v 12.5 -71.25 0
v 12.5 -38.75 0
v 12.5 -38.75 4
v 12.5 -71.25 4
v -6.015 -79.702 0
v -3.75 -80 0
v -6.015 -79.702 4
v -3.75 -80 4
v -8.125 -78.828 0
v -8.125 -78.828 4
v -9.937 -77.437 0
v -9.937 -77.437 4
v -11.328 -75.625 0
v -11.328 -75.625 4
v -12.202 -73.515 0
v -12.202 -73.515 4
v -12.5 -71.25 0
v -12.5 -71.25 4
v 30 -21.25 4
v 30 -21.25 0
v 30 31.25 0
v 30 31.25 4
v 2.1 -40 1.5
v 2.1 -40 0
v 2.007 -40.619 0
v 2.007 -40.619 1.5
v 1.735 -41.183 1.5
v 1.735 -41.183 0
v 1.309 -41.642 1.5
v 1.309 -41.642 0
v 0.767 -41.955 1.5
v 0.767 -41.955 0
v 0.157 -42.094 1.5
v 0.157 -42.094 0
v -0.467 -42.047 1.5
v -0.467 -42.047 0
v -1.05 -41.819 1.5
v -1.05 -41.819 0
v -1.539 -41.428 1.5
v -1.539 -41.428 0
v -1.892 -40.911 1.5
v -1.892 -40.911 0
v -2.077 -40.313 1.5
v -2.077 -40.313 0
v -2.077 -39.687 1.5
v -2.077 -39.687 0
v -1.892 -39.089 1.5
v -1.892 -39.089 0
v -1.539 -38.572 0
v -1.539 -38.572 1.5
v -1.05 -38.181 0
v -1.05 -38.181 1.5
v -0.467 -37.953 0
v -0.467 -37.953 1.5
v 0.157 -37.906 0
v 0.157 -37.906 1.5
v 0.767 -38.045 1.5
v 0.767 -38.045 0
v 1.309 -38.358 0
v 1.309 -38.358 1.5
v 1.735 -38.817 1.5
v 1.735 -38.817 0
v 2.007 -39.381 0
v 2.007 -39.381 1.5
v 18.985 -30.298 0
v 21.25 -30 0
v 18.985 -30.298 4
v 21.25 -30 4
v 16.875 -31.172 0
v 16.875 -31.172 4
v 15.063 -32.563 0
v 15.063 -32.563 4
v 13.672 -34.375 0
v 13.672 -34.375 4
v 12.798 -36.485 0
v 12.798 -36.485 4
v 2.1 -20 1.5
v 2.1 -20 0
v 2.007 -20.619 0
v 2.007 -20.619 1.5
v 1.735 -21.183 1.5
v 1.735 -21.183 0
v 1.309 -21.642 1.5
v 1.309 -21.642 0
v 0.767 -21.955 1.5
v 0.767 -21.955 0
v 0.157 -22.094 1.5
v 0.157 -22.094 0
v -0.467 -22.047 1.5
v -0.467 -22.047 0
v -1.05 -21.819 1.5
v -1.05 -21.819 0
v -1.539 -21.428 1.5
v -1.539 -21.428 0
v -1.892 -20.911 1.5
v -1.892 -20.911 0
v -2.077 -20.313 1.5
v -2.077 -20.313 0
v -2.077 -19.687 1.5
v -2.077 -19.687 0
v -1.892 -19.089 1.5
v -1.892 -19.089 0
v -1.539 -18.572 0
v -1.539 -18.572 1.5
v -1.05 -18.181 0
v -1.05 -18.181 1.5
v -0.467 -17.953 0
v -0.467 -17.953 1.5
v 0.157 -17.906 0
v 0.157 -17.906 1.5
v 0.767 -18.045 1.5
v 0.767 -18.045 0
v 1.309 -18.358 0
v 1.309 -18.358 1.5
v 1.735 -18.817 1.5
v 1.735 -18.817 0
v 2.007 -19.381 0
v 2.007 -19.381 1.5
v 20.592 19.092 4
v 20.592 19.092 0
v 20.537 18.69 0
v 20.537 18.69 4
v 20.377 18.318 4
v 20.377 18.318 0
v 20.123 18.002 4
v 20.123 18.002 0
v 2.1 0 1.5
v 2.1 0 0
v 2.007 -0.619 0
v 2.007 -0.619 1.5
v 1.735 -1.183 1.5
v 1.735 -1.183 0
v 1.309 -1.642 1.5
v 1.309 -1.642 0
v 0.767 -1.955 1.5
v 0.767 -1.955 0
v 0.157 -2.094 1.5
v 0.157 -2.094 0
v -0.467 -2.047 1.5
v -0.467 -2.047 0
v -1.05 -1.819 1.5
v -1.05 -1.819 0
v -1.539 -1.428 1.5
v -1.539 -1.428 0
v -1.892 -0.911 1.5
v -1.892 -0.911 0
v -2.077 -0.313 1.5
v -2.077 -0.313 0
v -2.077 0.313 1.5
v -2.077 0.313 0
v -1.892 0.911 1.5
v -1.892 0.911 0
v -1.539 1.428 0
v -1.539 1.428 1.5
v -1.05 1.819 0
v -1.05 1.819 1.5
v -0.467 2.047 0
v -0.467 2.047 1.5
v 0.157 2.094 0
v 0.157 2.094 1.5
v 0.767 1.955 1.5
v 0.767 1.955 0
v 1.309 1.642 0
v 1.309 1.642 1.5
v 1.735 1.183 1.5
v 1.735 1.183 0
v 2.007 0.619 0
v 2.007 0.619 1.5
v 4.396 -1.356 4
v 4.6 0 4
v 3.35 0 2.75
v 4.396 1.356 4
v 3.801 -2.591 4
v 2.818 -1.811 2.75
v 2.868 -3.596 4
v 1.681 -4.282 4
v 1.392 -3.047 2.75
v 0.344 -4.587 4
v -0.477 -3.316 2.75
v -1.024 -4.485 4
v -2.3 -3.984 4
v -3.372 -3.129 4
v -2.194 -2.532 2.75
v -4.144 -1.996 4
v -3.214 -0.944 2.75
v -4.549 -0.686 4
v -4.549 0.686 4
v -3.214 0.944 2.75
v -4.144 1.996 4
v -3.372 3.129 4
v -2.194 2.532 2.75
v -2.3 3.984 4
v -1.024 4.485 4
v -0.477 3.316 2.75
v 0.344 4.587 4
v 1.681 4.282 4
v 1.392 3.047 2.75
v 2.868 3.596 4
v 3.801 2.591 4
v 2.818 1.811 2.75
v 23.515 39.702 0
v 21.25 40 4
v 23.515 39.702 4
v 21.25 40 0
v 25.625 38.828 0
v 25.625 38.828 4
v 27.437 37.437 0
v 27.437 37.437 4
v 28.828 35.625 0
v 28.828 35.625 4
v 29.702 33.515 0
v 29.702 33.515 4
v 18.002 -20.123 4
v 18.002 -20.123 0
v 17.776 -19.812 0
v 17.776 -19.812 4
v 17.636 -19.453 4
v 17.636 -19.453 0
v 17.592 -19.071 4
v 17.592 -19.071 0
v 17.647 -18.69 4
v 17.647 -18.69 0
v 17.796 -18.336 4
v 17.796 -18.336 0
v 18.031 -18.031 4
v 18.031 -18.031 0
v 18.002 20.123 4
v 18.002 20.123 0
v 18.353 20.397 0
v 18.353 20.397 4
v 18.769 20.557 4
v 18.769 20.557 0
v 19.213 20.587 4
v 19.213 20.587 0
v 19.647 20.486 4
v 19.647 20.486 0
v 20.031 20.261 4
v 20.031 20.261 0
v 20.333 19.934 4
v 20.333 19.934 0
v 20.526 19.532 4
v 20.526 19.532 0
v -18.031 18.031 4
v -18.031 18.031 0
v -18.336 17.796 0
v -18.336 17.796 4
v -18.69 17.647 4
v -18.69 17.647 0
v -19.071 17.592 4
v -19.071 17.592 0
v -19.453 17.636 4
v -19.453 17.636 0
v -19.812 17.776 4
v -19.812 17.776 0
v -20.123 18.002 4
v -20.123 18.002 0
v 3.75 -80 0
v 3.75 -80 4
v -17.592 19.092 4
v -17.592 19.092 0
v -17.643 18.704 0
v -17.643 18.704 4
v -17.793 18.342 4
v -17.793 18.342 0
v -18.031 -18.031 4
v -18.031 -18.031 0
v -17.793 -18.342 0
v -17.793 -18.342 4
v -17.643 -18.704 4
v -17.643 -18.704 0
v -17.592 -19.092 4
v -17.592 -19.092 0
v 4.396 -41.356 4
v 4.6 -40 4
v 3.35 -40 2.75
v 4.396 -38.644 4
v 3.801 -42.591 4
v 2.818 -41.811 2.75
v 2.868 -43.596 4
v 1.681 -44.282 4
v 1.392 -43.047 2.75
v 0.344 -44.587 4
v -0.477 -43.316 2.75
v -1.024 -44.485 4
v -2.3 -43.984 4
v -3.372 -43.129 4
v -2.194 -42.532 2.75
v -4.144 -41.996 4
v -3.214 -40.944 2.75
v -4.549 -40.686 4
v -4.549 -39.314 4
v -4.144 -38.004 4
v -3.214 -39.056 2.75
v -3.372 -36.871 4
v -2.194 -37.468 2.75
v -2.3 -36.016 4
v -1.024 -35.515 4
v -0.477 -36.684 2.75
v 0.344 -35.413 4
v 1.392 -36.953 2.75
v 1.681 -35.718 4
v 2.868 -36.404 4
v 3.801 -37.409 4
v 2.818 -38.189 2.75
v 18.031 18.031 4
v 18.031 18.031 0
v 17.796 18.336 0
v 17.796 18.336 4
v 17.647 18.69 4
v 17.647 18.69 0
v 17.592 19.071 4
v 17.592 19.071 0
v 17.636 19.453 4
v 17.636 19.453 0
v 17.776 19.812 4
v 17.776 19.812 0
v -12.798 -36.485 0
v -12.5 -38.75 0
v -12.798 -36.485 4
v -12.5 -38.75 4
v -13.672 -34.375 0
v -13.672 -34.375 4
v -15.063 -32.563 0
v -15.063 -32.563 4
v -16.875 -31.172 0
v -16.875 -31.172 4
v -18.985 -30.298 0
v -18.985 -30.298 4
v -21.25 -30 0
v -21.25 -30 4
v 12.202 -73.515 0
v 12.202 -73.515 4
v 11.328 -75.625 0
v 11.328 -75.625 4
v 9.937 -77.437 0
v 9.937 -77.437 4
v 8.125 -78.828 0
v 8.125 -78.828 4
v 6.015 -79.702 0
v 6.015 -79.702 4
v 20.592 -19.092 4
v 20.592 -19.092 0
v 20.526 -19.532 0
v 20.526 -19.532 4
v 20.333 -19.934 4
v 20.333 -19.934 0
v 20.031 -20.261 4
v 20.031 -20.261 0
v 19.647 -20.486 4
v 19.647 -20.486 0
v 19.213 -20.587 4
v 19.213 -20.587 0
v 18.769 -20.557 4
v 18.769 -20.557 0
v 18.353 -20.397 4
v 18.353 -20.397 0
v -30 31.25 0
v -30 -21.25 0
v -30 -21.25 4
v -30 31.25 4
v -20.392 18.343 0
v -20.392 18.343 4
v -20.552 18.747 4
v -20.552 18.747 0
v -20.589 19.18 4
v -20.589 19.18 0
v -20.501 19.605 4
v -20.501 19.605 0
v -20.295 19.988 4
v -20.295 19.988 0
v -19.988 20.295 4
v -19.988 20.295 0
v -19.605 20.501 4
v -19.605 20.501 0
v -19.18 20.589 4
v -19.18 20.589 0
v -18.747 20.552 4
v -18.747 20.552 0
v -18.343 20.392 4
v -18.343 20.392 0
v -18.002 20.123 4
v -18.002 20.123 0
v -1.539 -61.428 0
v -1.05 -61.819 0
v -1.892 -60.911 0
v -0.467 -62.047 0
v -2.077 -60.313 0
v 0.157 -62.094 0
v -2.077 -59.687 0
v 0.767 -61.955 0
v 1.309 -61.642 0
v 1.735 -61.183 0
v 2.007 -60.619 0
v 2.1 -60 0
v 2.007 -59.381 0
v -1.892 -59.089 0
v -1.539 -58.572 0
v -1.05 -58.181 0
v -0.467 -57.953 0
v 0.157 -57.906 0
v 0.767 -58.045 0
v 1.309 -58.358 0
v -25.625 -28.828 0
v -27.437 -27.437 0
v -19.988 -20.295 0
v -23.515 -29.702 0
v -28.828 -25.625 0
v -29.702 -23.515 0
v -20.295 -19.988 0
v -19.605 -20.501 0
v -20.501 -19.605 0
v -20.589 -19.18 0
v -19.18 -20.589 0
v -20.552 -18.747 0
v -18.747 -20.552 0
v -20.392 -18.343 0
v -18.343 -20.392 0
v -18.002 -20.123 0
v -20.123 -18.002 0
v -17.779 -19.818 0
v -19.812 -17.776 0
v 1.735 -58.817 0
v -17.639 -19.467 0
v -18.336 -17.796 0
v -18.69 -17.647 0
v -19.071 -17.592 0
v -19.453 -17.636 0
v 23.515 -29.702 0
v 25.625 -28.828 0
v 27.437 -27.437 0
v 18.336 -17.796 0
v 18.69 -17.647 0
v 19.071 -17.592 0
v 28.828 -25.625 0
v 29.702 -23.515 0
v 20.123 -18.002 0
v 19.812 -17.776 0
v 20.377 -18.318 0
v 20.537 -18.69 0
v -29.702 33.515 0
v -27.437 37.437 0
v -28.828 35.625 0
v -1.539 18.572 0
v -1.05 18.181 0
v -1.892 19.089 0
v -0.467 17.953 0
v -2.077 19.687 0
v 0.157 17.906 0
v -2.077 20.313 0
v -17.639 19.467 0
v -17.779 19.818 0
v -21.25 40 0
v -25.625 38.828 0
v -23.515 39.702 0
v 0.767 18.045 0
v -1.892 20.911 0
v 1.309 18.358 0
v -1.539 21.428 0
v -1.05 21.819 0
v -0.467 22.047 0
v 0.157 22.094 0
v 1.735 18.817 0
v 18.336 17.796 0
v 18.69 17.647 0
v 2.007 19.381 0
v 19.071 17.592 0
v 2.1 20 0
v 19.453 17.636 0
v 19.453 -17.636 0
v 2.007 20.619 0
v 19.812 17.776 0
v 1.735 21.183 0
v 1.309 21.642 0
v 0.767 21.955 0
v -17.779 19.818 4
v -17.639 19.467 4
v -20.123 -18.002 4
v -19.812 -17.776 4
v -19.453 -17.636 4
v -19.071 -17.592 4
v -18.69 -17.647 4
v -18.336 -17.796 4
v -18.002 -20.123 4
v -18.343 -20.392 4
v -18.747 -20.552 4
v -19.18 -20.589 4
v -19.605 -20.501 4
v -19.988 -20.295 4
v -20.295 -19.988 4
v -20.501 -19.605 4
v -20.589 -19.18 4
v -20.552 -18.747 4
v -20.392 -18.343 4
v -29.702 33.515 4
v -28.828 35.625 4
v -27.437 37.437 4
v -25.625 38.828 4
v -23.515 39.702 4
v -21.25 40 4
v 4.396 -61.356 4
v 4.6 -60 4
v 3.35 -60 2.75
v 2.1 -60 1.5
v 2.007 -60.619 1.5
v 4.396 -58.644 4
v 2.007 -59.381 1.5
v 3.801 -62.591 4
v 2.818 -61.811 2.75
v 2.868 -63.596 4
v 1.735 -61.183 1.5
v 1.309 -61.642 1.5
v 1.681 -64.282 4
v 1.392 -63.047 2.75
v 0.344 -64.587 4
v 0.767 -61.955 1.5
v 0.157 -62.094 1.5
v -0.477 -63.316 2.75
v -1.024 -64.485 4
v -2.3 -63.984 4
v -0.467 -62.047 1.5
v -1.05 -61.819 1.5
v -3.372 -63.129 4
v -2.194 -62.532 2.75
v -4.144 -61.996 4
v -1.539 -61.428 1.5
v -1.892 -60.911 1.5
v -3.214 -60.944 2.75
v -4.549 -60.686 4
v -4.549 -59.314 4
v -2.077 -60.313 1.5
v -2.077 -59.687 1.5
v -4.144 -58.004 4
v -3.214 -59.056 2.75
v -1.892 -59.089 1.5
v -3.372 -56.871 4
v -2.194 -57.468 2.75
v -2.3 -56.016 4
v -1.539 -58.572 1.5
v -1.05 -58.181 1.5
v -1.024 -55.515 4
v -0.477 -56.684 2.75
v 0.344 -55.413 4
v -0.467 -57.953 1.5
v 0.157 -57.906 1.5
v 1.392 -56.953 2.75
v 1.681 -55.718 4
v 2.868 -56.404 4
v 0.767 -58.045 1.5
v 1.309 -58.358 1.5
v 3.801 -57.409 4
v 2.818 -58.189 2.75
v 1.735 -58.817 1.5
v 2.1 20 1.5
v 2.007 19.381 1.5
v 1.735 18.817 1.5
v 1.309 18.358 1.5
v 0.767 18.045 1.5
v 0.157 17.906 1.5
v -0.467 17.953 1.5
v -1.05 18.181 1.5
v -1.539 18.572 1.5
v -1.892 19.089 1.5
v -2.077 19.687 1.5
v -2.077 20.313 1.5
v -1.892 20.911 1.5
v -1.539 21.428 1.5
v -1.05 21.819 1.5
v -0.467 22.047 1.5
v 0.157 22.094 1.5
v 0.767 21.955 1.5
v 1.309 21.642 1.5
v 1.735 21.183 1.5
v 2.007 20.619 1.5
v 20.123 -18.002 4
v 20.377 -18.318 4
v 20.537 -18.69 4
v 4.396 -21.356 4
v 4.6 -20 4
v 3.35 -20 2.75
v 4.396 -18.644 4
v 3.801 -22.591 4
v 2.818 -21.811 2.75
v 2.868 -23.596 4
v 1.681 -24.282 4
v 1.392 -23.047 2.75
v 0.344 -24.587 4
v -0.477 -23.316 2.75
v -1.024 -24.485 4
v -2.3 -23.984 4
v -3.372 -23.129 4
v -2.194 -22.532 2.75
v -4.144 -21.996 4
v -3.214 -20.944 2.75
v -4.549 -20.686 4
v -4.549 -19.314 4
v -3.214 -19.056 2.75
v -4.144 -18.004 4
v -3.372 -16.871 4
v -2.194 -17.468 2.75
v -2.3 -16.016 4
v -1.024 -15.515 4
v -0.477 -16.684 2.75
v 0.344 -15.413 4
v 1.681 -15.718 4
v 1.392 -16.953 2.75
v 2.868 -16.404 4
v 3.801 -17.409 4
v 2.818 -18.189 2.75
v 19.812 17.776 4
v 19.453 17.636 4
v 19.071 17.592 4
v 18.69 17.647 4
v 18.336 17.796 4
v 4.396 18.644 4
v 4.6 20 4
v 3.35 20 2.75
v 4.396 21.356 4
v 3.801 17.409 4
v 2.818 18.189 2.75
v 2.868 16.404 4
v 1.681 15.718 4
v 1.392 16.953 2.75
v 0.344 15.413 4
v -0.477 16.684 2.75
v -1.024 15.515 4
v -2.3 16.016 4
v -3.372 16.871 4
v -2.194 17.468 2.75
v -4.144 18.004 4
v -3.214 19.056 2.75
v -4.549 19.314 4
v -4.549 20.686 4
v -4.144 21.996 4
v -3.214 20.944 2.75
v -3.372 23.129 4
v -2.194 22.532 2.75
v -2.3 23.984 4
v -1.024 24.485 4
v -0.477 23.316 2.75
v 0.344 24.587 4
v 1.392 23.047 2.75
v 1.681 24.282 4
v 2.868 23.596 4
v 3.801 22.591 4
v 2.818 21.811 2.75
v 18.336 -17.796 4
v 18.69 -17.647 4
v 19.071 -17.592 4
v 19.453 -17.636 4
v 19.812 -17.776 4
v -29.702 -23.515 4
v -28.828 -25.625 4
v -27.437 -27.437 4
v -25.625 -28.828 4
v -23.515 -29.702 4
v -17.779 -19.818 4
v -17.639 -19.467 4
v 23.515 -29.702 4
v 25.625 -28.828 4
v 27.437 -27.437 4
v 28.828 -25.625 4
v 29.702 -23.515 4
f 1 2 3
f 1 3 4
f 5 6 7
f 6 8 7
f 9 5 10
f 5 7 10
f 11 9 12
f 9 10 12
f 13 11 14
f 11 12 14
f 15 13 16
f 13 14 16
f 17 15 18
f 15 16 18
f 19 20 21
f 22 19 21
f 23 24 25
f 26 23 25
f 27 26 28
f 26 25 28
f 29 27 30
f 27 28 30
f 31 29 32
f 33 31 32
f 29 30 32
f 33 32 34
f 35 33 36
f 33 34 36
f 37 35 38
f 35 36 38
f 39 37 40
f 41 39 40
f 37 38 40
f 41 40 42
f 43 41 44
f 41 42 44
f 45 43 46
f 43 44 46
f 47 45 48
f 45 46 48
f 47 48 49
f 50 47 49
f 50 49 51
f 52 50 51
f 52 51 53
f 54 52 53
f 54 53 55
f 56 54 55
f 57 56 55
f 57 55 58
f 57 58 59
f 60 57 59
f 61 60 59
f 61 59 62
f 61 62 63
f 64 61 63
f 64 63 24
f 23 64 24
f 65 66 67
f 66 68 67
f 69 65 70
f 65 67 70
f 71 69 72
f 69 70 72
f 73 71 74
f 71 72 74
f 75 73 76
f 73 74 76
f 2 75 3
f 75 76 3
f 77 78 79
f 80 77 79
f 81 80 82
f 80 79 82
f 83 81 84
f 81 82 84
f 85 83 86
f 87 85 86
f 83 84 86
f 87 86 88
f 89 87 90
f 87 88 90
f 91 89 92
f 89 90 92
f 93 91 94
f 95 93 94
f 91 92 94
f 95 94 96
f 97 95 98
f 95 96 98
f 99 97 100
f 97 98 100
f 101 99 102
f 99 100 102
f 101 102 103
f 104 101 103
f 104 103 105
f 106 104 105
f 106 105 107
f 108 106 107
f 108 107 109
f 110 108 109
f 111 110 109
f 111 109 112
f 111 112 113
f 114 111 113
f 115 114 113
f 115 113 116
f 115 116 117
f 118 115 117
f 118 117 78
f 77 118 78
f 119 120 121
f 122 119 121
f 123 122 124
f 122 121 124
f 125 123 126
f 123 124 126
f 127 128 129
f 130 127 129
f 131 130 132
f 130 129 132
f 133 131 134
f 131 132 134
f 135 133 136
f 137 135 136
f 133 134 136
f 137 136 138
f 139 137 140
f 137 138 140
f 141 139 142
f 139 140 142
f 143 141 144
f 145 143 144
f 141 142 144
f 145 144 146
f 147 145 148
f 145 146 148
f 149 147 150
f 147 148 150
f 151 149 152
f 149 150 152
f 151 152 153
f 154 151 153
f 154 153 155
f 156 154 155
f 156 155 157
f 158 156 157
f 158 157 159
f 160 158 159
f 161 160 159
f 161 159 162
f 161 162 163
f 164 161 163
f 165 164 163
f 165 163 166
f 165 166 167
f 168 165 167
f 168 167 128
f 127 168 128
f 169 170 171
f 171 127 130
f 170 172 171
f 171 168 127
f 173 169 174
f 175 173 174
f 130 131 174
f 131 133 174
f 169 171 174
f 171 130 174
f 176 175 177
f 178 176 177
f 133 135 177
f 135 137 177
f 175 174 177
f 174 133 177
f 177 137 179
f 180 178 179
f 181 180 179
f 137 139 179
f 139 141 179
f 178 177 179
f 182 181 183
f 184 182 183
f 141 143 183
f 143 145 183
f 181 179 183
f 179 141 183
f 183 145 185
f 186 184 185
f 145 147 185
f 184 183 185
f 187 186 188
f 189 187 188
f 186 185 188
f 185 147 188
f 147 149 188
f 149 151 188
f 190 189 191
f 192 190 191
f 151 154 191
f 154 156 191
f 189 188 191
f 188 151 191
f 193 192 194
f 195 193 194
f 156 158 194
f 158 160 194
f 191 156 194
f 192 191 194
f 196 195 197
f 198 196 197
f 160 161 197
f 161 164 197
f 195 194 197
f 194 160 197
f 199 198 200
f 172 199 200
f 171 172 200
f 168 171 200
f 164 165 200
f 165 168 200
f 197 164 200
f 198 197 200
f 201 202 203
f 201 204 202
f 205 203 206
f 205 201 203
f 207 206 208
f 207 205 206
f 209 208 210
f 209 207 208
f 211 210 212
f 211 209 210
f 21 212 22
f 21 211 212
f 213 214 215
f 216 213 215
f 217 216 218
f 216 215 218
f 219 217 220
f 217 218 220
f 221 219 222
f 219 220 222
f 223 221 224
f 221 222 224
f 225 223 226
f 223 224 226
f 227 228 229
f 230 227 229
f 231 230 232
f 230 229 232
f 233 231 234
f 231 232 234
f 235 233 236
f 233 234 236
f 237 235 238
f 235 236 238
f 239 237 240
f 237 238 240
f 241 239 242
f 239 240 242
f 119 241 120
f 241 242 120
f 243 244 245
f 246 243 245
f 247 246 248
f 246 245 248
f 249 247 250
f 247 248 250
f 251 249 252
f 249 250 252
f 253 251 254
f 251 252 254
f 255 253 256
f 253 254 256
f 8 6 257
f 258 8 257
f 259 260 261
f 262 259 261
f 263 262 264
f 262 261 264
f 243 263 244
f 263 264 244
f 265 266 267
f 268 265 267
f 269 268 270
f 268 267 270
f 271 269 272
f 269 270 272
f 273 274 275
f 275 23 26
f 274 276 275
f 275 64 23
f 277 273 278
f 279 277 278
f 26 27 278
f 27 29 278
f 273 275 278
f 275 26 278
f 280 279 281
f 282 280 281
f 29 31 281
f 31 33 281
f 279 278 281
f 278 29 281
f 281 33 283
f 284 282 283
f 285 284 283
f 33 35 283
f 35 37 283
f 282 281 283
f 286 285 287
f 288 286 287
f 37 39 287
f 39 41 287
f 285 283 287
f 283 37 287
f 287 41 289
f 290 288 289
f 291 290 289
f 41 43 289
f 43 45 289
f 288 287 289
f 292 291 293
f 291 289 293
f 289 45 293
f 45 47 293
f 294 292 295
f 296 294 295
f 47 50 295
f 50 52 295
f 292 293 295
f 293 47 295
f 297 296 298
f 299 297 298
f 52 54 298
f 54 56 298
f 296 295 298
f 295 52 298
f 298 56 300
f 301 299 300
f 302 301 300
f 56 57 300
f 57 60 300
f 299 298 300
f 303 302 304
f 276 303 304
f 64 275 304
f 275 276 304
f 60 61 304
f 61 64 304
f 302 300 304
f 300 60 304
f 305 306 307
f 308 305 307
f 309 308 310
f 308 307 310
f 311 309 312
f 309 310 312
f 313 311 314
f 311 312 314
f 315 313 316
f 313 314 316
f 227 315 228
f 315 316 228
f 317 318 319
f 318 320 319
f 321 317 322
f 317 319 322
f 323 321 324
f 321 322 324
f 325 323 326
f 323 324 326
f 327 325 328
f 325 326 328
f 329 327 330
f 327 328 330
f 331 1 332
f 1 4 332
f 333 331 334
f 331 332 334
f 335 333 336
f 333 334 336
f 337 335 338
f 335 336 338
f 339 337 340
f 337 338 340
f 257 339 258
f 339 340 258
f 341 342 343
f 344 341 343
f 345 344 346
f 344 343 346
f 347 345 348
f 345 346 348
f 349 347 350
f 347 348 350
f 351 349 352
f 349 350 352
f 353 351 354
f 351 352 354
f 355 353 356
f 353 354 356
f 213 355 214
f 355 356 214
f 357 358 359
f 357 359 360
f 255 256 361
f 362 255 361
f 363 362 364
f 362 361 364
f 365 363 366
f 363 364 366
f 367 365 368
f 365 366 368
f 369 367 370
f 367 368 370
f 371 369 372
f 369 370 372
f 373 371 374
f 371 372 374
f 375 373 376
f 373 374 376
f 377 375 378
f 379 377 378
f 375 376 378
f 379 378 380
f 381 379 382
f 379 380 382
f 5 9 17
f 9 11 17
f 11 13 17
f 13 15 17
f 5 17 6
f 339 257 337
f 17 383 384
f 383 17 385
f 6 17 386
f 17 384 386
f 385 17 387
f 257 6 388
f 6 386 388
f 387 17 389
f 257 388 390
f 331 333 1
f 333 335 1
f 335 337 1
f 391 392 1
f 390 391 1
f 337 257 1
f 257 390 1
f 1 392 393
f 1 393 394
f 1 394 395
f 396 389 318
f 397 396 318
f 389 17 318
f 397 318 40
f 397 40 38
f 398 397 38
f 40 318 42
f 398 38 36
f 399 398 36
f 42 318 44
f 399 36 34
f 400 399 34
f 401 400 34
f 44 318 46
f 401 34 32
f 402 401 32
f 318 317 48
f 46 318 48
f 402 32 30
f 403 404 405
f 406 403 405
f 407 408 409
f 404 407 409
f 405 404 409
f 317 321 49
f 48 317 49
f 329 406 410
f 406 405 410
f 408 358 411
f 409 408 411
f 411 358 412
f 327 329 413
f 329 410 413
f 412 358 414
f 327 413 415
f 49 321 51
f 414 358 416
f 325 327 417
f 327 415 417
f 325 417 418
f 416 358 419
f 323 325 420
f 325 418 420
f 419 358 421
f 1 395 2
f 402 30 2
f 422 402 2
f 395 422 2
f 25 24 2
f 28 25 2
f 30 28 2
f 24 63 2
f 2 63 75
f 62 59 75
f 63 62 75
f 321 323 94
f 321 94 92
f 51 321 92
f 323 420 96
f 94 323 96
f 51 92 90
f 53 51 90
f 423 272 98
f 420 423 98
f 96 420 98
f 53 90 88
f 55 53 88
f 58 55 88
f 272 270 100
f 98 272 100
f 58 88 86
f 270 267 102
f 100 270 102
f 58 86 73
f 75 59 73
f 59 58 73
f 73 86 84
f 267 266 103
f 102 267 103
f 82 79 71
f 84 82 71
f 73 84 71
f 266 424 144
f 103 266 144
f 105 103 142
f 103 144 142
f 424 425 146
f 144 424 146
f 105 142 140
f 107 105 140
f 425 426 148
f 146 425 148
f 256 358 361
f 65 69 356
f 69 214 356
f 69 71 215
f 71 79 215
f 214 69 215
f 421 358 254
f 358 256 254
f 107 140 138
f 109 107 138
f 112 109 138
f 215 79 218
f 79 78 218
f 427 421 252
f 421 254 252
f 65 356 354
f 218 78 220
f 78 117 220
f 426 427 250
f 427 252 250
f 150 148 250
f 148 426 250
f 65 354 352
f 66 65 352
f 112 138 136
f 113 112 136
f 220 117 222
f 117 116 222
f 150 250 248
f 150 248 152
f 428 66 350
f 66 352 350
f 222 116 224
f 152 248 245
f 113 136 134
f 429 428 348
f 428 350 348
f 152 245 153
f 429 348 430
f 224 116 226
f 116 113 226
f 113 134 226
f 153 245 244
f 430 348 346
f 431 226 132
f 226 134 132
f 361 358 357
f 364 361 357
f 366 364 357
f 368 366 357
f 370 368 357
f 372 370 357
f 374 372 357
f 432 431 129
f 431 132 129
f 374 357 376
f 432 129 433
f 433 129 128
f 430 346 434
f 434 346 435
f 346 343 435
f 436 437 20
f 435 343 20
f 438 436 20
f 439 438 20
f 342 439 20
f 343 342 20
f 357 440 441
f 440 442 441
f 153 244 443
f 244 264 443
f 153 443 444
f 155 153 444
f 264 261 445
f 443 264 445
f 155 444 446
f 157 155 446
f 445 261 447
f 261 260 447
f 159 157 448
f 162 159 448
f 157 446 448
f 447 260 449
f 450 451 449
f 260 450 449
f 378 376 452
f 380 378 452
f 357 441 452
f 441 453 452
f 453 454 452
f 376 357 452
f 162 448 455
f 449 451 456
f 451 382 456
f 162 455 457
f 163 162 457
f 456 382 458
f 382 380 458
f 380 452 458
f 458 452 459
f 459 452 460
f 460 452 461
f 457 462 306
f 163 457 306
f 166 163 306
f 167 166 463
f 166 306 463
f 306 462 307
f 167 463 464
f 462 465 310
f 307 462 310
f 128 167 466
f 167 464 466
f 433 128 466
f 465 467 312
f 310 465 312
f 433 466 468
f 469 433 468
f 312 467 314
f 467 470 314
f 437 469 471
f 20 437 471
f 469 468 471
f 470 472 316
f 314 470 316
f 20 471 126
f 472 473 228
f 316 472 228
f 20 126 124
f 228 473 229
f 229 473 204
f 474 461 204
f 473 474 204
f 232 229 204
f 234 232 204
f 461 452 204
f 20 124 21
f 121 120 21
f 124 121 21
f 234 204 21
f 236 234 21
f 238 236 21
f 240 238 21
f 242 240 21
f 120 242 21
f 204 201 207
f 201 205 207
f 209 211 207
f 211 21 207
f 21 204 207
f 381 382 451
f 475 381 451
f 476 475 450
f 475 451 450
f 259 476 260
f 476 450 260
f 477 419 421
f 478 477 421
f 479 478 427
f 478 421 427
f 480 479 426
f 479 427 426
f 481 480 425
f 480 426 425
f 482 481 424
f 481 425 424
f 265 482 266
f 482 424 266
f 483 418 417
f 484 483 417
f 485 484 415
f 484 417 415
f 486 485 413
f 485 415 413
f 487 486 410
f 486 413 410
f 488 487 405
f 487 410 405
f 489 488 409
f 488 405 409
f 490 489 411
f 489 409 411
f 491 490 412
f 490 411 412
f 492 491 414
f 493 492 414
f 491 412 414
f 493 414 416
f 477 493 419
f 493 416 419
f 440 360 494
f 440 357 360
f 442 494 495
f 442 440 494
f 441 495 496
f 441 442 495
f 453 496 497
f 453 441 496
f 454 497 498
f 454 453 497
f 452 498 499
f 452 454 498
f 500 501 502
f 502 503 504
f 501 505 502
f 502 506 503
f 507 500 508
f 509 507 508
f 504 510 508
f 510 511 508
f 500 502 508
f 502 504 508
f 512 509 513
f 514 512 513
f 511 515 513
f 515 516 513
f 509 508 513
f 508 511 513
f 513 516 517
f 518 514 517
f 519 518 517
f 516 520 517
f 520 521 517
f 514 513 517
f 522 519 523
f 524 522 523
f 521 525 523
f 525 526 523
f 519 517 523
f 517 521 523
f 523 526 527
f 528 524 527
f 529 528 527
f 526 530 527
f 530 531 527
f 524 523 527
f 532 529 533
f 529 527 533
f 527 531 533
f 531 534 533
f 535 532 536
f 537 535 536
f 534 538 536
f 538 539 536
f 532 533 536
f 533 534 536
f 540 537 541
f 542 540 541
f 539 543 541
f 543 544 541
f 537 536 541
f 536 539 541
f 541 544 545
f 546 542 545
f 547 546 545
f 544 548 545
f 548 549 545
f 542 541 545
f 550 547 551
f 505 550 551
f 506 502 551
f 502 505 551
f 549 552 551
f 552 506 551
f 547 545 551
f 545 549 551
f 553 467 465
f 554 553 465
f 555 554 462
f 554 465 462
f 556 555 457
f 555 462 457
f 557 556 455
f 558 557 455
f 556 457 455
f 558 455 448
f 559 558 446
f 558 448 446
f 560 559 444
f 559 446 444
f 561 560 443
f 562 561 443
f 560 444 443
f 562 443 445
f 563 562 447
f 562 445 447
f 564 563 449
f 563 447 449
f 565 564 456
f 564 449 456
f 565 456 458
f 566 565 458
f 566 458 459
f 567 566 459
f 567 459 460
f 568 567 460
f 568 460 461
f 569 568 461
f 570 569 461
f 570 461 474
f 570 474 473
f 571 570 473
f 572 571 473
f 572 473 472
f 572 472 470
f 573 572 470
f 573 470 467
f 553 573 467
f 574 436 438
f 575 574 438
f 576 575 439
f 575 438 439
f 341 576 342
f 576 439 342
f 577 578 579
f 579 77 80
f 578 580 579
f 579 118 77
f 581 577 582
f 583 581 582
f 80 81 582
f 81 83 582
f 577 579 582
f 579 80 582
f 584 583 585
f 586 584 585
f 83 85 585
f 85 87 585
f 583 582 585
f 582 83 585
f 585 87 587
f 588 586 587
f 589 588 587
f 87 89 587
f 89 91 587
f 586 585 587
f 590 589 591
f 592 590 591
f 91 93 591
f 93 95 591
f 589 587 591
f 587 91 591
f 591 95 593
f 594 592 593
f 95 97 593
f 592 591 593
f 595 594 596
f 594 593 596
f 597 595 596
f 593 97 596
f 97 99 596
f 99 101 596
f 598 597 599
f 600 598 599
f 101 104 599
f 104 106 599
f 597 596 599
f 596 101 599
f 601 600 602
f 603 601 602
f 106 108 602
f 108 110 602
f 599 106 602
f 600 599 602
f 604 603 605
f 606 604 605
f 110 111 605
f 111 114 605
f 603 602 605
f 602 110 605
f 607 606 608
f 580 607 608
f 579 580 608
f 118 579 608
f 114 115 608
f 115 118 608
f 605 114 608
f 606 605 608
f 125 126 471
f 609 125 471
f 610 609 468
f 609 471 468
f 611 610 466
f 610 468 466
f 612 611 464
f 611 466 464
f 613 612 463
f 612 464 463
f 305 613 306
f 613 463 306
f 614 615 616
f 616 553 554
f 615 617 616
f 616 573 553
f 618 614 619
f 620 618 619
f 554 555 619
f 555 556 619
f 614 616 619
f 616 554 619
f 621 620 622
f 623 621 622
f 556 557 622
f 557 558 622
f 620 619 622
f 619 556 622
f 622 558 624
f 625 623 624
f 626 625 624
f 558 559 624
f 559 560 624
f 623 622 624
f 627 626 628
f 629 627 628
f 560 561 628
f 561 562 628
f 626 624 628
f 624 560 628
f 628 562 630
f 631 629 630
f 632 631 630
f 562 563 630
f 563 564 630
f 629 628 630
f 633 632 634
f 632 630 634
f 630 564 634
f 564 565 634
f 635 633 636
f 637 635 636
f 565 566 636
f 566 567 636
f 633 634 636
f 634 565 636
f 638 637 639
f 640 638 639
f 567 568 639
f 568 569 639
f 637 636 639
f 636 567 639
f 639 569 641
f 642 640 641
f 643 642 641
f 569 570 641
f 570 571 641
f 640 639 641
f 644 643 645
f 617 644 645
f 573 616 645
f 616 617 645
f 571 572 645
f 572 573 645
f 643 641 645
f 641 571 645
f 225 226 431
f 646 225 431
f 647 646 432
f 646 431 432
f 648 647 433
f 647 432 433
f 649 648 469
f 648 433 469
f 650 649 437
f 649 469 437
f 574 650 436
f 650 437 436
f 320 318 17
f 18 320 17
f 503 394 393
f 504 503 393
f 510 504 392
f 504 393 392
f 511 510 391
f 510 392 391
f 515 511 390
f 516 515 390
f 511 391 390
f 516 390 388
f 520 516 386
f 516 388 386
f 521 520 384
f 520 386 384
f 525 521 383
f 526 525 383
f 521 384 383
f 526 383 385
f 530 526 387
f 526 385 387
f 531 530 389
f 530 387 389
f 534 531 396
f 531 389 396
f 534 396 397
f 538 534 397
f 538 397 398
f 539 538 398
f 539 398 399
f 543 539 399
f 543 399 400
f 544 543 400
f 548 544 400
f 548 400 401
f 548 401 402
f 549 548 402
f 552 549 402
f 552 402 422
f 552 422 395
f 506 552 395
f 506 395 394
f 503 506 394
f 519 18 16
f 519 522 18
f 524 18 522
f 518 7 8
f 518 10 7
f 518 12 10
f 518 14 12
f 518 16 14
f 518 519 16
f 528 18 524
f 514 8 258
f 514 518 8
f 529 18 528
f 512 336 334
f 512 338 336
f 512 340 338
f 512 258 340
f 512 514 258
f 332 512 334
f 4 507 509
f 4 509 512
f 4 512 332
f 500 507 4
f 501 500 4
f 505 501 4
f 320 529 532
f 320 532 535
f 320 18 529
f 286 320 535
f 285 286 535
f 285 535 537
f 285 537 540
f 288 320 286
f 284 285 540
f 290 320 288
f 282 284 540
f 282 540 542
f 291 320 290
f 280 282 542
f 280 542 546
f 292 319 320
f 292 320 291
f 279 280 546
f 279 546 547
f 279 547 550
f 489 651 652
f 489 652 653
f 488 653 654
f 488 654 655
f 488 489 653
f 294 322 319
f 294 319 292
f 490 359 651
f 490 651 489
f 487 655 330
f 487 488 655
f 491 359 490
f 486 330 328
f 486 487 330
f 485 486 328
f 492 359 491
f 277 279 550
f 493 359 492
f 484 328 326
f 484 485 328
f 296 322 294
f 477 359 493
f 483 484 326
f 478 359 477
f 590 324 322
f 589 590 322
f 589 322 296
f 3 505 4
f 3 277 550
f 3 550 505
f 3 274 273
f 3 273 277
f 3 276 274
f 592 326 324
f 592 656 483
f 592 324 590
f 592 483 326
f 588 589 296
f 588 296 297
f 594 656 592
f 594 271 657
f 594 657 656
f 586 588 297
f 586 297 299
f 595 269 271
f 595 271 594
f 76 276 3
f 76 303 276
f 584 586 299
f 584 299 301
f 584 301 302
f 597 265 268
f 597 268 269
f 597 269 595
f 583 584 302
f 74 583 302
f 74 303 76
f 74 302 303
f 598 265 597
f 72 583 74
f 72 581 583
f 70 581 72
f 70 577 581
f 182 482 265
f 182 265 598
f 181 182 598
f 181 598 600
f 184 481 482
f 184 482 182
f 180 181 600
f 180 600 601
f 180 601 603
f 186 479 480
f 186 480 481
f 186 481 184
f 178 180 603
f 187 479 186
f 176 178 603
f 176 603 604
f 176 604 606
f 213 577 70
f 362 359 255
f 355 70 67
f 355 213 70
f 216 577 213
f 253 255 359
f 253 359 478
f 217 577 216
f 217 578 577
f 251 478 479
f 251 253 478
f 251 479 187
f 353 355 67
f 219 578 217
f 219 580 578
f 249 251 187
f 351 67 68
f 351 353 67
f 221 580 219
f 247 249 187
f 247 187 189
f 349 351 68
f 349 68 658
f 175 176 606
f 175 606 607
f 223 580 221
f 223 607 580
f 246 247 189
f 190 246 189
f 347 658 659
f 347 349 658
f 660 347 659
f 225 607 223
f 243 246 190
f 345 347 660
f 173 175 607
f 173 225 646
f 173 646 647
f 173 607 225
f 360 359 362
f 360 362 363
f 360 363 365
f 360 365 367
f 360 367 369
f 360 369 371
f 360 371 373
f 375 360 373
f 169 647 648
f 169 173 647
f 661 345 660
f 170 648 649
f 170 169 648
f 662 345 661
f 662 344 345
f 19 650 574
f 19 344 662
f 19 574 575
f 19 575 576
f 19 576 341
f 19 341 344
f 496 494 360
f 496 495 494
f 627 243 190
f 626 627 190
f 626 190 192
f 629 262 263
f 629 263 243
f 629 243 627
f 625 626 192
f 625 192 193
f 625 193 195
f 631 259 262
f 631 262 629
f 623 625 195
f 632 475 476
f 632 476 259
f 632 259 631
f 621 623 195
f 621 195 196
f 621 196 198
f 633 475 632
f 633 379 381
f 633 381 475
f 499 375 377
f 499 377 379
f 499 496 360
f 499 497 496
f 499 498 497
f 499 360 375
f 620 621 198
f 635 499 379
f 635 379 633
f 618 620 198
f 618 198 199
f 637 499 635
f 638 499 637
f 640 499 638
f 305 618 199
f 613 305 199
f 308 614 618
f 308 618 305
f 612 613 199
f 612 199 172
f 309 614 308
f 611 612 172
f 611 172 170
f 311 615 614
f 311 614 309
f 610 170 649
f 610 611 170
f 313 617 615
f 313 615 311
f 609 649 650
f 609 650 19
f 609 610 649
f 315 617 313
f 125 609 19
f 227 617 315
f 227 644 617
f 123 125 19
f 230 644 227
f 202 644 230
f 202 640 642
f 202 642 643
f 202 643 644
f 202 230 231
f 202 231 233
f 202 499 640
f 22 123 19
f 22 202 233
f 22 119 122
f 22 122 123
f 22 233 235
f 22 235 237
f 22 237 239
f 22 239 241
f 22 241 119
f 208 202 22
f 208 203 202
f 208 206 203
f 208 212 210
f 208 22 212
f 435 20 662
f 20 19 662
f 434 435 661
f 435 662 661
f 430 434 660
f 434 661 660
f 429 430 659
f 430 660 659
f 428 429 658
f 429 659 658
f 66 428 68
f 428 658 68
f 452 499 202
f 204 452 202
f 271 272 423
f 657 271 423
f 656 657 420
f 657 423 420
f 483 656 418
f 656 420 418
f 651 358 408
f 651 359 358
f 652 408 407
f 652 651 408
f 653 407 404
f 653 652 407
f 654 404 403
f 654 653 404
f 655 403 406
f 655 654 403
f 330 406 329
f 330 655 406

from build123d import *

# Parameters (mm, degrees)
F0_W     = 60
F0_H     = 160
F1_DEPTH = 4
F2_W     = 60
F2_H     = 40
F3_DEPTH = 4.001
F4_R     = 2.1
F5_DEPTH = 4.001
F6_SIZE  = 2.5
F7_W     = 17.5
F7_H     = 50
F8_DEPTH = 4.001
F9_R     = 8.74999


# Not quite as in the source:
# - a fillet or chamfer is up to 0.001 mm smaller than in the source, because OpenCascade refuses the exact size


with BuildPart() as f1:
    # F0 (on Top) → F1 (new body)
    with BuildSketch(Plane.XY):
        Rectangle(F0_W, F0_H)
        with BuildLine():
            ThreePointArc((20.122671197, 18.002169422), (25.2221343498, 9.6355559695), (27, 0))
            ThreePointArc((27, 0), (25.2221343498, -9.6355559695), (20.122671197, -18.002169422))
            ThreePointArc((20.122671197, -18.002169422), (20.4695953547, -18.4986639746), (20.591883092, -19.091883092))
            ThreePointArc((20.591883092, -19.091883092), (19.6466035148, -20.4855420362), (18.002169422, -20.122671197))
            ThreePointArc((18.002169422, -20.122671197), (0, -27), (-18.002169422, -20.122671197))
            ThreePointArc((-18.002169422, -20.122671197), (-20.1525432638, -20.1525432638), (-20.122671197, -18.002169422))
            ThreePointArc((-20.122671197, -18.002169422), (-27, 0), (-20.122671197, 18.002169422))
            ThreePointArc((-20.122671197, 18.002169422), (-20.1525432638, 20.1525432638), (-18.002169422, 20.122671197))
            ThreePointArc((-18.002169422, 20.122671197), (0, 27), (18.002169422, 20.122671197))
            ThreePointArc((18.002169422, 20.122671197), (19.6466035148, 20.4855420362), (20.591883092, 19.091883092))
            ThreePointArc((20.591883092, 19.091883092), (20.4695953547, 18.4986639746), (20.122671197, 18.002169422))
        make_face(mode=Mode.SUBTRACT)
        with BuildLine():
            Line((-18.0312229203, -18.0312229203), (0, 0))
            Line((0, 0), (-18.0312229203, 18.0312229203))
            ThreePointArc((-18.0312229203, 18.0312229203), (-19.0710477486, 17.5920278029), (-20.122671197, 18.002169422))
            ThreePointArc((-20.122671197, 18.002169422), (-27, 0), (-20.122671197, -18.002169422))
            ThreePointArc((-20.122671197, -18.002169422), (-19.0710477486, -17.5920278029), (-18.0312229203, -18.0312229203))
        make_face()
        with BuildLine():
            Line((0, 0), (18.0312229203, 18.0312229203))
            ThreePointArc((18.0312229203, 18.0312229203), (17.5920278029, 19.0710477486), (18.002169422, 20.122671197))
            ThreePointArc((18.002169422, 20.122671197), (0, 27), (-18.002169422, 20.122671197))
            ThreePointArc((-18.002169422, 20.122671197), (-17.6982241479, 19.6466035148), (-17.591883092, 19.091883092))
            ThreePointArc((-17.591883092, 19.091883092), (-17.7060637933, 18.5178579435), (-18.0312229203, 18.0312229203))
            Line((-18.0312229203, 18.0312229203), (0, 0))
        make_face()
        with BuildLine():
            ThreePointArc((20.122671197, -18.002169422), (25.2221343498, -9.6355559695), (27, 0))
            ThreePointArc((27, 0), (25.2221343498, 9.6355559695), (20.122671197, 18.002169422))
            ThreePointArc((20.122671197, 18.002169422), (19.0710477486, 17.5920278029), (18.0312229203, 18.0312229203))
            Line((18.0312229203, 18.0312229203), (0, 0))
            Line((0, 0), (18.0312229203, -18.0312229203))
            ThreePointArc((18.0312229203, -18.0312229203), (19.0710477486, -17.5920278029), (20.122671197, -18.002169422))
        make_face()
        with BuildLine():
            ThreePointArc((18.002169422, -20.122671197), (17.5920278029, -19.0710477486), (18.0312229203, -18.0312229203))
            Line((18.0312229203, -18.0312229203), (0, 0))
            Line((0, 0), (-18.0312229203, -18.0312229203))
            ThreePointArc((-18.0312229203, -18.0312229203), (-17.7060637933, -18.5178579435), (-17.591883092, -19.091883092))
            ThreePointArc((-17.591883092, -19.091883092), (-17.6982241479, -19.6466035148), (-18.002169422, -20.122671197))
            ThreePointArc((-18.002169422, -20.122671197), (0, -27), (18.002169422, -20.122671197))
        make_face()
    extrude(amount=F1_DEPTH)

    # F2 (on face) → F3 (cut, through all)
    with BuildSketch(Plane.XY.offset(4)):
        with Locations((0, 60)):
            Rectangle(F2_W, F2_H)
    extrude(amount=-F3_DEPTH, mode=Mode.SUBTRACT)

    # F4 (on face) → F5 (cut, through all)
    with BuildSketch(Plane(origin=(0, 0, 0), x_dir=(1, 0, 0), z_dir=(0, 0, -1))):
        with Locations((0, 40)):
            Circle(F4_R)
        Circle(F4_R)
        with Locations((0, 20)):
            Circle(F4_R)
        with Locations((0, -20)):
            Circle(F4_R)
        with Locations((0, 60)):
            Circle(F4_R)
    extrude(amount=-F5_DEPTH, mode=Mode.SUBTRACT)

    # F6
    f6_edges = [f1.edges().sort_by_distance(p)[0] for p in [
        (-2.1, -60, 4),
        (-2.1, -40, 4),
        (-2.1, -20, 4),
        (-2.1, 0, 4),
        (-2.1, 20, 4),
    ]]
    chamfer(f6_edges, length=F6_SIZE)

    # F7 (on face) → F8 (cut, through all)
    with BuildSketch(Plane(origin=(0, 0, 0), x_dir=(1, 0, 0), z_dir=(0, 0, -1))):
        with Locations((-21.25, 55)):
            Rectangle(F7_W, F7_H)
        with Locations((21.25, 55)):
            Rectangle(F7_W, F7_H)
    extrude(amount=-F8_DEPTH, mode=Mode.SUBTRACT)

    # F9 (radius 8.75 in the source; OpenCascade refuses exactly that, so slightly less here)
    f9_edges = [f1.edges().sort_by_distance(p)[0] for p in [
        (-12.5, -30, 2),
        (-30, -30, 2),
        (12.5, -30, 2),
        (30, -30, 2),
        (-30, 40, 2),
        (30, 40, 2),
        (-12.5, -80, 2),
        (12.5, -80, 2),
    ]]
    fillet(f9_edges, radius=F9_R)


solid = f1.part
